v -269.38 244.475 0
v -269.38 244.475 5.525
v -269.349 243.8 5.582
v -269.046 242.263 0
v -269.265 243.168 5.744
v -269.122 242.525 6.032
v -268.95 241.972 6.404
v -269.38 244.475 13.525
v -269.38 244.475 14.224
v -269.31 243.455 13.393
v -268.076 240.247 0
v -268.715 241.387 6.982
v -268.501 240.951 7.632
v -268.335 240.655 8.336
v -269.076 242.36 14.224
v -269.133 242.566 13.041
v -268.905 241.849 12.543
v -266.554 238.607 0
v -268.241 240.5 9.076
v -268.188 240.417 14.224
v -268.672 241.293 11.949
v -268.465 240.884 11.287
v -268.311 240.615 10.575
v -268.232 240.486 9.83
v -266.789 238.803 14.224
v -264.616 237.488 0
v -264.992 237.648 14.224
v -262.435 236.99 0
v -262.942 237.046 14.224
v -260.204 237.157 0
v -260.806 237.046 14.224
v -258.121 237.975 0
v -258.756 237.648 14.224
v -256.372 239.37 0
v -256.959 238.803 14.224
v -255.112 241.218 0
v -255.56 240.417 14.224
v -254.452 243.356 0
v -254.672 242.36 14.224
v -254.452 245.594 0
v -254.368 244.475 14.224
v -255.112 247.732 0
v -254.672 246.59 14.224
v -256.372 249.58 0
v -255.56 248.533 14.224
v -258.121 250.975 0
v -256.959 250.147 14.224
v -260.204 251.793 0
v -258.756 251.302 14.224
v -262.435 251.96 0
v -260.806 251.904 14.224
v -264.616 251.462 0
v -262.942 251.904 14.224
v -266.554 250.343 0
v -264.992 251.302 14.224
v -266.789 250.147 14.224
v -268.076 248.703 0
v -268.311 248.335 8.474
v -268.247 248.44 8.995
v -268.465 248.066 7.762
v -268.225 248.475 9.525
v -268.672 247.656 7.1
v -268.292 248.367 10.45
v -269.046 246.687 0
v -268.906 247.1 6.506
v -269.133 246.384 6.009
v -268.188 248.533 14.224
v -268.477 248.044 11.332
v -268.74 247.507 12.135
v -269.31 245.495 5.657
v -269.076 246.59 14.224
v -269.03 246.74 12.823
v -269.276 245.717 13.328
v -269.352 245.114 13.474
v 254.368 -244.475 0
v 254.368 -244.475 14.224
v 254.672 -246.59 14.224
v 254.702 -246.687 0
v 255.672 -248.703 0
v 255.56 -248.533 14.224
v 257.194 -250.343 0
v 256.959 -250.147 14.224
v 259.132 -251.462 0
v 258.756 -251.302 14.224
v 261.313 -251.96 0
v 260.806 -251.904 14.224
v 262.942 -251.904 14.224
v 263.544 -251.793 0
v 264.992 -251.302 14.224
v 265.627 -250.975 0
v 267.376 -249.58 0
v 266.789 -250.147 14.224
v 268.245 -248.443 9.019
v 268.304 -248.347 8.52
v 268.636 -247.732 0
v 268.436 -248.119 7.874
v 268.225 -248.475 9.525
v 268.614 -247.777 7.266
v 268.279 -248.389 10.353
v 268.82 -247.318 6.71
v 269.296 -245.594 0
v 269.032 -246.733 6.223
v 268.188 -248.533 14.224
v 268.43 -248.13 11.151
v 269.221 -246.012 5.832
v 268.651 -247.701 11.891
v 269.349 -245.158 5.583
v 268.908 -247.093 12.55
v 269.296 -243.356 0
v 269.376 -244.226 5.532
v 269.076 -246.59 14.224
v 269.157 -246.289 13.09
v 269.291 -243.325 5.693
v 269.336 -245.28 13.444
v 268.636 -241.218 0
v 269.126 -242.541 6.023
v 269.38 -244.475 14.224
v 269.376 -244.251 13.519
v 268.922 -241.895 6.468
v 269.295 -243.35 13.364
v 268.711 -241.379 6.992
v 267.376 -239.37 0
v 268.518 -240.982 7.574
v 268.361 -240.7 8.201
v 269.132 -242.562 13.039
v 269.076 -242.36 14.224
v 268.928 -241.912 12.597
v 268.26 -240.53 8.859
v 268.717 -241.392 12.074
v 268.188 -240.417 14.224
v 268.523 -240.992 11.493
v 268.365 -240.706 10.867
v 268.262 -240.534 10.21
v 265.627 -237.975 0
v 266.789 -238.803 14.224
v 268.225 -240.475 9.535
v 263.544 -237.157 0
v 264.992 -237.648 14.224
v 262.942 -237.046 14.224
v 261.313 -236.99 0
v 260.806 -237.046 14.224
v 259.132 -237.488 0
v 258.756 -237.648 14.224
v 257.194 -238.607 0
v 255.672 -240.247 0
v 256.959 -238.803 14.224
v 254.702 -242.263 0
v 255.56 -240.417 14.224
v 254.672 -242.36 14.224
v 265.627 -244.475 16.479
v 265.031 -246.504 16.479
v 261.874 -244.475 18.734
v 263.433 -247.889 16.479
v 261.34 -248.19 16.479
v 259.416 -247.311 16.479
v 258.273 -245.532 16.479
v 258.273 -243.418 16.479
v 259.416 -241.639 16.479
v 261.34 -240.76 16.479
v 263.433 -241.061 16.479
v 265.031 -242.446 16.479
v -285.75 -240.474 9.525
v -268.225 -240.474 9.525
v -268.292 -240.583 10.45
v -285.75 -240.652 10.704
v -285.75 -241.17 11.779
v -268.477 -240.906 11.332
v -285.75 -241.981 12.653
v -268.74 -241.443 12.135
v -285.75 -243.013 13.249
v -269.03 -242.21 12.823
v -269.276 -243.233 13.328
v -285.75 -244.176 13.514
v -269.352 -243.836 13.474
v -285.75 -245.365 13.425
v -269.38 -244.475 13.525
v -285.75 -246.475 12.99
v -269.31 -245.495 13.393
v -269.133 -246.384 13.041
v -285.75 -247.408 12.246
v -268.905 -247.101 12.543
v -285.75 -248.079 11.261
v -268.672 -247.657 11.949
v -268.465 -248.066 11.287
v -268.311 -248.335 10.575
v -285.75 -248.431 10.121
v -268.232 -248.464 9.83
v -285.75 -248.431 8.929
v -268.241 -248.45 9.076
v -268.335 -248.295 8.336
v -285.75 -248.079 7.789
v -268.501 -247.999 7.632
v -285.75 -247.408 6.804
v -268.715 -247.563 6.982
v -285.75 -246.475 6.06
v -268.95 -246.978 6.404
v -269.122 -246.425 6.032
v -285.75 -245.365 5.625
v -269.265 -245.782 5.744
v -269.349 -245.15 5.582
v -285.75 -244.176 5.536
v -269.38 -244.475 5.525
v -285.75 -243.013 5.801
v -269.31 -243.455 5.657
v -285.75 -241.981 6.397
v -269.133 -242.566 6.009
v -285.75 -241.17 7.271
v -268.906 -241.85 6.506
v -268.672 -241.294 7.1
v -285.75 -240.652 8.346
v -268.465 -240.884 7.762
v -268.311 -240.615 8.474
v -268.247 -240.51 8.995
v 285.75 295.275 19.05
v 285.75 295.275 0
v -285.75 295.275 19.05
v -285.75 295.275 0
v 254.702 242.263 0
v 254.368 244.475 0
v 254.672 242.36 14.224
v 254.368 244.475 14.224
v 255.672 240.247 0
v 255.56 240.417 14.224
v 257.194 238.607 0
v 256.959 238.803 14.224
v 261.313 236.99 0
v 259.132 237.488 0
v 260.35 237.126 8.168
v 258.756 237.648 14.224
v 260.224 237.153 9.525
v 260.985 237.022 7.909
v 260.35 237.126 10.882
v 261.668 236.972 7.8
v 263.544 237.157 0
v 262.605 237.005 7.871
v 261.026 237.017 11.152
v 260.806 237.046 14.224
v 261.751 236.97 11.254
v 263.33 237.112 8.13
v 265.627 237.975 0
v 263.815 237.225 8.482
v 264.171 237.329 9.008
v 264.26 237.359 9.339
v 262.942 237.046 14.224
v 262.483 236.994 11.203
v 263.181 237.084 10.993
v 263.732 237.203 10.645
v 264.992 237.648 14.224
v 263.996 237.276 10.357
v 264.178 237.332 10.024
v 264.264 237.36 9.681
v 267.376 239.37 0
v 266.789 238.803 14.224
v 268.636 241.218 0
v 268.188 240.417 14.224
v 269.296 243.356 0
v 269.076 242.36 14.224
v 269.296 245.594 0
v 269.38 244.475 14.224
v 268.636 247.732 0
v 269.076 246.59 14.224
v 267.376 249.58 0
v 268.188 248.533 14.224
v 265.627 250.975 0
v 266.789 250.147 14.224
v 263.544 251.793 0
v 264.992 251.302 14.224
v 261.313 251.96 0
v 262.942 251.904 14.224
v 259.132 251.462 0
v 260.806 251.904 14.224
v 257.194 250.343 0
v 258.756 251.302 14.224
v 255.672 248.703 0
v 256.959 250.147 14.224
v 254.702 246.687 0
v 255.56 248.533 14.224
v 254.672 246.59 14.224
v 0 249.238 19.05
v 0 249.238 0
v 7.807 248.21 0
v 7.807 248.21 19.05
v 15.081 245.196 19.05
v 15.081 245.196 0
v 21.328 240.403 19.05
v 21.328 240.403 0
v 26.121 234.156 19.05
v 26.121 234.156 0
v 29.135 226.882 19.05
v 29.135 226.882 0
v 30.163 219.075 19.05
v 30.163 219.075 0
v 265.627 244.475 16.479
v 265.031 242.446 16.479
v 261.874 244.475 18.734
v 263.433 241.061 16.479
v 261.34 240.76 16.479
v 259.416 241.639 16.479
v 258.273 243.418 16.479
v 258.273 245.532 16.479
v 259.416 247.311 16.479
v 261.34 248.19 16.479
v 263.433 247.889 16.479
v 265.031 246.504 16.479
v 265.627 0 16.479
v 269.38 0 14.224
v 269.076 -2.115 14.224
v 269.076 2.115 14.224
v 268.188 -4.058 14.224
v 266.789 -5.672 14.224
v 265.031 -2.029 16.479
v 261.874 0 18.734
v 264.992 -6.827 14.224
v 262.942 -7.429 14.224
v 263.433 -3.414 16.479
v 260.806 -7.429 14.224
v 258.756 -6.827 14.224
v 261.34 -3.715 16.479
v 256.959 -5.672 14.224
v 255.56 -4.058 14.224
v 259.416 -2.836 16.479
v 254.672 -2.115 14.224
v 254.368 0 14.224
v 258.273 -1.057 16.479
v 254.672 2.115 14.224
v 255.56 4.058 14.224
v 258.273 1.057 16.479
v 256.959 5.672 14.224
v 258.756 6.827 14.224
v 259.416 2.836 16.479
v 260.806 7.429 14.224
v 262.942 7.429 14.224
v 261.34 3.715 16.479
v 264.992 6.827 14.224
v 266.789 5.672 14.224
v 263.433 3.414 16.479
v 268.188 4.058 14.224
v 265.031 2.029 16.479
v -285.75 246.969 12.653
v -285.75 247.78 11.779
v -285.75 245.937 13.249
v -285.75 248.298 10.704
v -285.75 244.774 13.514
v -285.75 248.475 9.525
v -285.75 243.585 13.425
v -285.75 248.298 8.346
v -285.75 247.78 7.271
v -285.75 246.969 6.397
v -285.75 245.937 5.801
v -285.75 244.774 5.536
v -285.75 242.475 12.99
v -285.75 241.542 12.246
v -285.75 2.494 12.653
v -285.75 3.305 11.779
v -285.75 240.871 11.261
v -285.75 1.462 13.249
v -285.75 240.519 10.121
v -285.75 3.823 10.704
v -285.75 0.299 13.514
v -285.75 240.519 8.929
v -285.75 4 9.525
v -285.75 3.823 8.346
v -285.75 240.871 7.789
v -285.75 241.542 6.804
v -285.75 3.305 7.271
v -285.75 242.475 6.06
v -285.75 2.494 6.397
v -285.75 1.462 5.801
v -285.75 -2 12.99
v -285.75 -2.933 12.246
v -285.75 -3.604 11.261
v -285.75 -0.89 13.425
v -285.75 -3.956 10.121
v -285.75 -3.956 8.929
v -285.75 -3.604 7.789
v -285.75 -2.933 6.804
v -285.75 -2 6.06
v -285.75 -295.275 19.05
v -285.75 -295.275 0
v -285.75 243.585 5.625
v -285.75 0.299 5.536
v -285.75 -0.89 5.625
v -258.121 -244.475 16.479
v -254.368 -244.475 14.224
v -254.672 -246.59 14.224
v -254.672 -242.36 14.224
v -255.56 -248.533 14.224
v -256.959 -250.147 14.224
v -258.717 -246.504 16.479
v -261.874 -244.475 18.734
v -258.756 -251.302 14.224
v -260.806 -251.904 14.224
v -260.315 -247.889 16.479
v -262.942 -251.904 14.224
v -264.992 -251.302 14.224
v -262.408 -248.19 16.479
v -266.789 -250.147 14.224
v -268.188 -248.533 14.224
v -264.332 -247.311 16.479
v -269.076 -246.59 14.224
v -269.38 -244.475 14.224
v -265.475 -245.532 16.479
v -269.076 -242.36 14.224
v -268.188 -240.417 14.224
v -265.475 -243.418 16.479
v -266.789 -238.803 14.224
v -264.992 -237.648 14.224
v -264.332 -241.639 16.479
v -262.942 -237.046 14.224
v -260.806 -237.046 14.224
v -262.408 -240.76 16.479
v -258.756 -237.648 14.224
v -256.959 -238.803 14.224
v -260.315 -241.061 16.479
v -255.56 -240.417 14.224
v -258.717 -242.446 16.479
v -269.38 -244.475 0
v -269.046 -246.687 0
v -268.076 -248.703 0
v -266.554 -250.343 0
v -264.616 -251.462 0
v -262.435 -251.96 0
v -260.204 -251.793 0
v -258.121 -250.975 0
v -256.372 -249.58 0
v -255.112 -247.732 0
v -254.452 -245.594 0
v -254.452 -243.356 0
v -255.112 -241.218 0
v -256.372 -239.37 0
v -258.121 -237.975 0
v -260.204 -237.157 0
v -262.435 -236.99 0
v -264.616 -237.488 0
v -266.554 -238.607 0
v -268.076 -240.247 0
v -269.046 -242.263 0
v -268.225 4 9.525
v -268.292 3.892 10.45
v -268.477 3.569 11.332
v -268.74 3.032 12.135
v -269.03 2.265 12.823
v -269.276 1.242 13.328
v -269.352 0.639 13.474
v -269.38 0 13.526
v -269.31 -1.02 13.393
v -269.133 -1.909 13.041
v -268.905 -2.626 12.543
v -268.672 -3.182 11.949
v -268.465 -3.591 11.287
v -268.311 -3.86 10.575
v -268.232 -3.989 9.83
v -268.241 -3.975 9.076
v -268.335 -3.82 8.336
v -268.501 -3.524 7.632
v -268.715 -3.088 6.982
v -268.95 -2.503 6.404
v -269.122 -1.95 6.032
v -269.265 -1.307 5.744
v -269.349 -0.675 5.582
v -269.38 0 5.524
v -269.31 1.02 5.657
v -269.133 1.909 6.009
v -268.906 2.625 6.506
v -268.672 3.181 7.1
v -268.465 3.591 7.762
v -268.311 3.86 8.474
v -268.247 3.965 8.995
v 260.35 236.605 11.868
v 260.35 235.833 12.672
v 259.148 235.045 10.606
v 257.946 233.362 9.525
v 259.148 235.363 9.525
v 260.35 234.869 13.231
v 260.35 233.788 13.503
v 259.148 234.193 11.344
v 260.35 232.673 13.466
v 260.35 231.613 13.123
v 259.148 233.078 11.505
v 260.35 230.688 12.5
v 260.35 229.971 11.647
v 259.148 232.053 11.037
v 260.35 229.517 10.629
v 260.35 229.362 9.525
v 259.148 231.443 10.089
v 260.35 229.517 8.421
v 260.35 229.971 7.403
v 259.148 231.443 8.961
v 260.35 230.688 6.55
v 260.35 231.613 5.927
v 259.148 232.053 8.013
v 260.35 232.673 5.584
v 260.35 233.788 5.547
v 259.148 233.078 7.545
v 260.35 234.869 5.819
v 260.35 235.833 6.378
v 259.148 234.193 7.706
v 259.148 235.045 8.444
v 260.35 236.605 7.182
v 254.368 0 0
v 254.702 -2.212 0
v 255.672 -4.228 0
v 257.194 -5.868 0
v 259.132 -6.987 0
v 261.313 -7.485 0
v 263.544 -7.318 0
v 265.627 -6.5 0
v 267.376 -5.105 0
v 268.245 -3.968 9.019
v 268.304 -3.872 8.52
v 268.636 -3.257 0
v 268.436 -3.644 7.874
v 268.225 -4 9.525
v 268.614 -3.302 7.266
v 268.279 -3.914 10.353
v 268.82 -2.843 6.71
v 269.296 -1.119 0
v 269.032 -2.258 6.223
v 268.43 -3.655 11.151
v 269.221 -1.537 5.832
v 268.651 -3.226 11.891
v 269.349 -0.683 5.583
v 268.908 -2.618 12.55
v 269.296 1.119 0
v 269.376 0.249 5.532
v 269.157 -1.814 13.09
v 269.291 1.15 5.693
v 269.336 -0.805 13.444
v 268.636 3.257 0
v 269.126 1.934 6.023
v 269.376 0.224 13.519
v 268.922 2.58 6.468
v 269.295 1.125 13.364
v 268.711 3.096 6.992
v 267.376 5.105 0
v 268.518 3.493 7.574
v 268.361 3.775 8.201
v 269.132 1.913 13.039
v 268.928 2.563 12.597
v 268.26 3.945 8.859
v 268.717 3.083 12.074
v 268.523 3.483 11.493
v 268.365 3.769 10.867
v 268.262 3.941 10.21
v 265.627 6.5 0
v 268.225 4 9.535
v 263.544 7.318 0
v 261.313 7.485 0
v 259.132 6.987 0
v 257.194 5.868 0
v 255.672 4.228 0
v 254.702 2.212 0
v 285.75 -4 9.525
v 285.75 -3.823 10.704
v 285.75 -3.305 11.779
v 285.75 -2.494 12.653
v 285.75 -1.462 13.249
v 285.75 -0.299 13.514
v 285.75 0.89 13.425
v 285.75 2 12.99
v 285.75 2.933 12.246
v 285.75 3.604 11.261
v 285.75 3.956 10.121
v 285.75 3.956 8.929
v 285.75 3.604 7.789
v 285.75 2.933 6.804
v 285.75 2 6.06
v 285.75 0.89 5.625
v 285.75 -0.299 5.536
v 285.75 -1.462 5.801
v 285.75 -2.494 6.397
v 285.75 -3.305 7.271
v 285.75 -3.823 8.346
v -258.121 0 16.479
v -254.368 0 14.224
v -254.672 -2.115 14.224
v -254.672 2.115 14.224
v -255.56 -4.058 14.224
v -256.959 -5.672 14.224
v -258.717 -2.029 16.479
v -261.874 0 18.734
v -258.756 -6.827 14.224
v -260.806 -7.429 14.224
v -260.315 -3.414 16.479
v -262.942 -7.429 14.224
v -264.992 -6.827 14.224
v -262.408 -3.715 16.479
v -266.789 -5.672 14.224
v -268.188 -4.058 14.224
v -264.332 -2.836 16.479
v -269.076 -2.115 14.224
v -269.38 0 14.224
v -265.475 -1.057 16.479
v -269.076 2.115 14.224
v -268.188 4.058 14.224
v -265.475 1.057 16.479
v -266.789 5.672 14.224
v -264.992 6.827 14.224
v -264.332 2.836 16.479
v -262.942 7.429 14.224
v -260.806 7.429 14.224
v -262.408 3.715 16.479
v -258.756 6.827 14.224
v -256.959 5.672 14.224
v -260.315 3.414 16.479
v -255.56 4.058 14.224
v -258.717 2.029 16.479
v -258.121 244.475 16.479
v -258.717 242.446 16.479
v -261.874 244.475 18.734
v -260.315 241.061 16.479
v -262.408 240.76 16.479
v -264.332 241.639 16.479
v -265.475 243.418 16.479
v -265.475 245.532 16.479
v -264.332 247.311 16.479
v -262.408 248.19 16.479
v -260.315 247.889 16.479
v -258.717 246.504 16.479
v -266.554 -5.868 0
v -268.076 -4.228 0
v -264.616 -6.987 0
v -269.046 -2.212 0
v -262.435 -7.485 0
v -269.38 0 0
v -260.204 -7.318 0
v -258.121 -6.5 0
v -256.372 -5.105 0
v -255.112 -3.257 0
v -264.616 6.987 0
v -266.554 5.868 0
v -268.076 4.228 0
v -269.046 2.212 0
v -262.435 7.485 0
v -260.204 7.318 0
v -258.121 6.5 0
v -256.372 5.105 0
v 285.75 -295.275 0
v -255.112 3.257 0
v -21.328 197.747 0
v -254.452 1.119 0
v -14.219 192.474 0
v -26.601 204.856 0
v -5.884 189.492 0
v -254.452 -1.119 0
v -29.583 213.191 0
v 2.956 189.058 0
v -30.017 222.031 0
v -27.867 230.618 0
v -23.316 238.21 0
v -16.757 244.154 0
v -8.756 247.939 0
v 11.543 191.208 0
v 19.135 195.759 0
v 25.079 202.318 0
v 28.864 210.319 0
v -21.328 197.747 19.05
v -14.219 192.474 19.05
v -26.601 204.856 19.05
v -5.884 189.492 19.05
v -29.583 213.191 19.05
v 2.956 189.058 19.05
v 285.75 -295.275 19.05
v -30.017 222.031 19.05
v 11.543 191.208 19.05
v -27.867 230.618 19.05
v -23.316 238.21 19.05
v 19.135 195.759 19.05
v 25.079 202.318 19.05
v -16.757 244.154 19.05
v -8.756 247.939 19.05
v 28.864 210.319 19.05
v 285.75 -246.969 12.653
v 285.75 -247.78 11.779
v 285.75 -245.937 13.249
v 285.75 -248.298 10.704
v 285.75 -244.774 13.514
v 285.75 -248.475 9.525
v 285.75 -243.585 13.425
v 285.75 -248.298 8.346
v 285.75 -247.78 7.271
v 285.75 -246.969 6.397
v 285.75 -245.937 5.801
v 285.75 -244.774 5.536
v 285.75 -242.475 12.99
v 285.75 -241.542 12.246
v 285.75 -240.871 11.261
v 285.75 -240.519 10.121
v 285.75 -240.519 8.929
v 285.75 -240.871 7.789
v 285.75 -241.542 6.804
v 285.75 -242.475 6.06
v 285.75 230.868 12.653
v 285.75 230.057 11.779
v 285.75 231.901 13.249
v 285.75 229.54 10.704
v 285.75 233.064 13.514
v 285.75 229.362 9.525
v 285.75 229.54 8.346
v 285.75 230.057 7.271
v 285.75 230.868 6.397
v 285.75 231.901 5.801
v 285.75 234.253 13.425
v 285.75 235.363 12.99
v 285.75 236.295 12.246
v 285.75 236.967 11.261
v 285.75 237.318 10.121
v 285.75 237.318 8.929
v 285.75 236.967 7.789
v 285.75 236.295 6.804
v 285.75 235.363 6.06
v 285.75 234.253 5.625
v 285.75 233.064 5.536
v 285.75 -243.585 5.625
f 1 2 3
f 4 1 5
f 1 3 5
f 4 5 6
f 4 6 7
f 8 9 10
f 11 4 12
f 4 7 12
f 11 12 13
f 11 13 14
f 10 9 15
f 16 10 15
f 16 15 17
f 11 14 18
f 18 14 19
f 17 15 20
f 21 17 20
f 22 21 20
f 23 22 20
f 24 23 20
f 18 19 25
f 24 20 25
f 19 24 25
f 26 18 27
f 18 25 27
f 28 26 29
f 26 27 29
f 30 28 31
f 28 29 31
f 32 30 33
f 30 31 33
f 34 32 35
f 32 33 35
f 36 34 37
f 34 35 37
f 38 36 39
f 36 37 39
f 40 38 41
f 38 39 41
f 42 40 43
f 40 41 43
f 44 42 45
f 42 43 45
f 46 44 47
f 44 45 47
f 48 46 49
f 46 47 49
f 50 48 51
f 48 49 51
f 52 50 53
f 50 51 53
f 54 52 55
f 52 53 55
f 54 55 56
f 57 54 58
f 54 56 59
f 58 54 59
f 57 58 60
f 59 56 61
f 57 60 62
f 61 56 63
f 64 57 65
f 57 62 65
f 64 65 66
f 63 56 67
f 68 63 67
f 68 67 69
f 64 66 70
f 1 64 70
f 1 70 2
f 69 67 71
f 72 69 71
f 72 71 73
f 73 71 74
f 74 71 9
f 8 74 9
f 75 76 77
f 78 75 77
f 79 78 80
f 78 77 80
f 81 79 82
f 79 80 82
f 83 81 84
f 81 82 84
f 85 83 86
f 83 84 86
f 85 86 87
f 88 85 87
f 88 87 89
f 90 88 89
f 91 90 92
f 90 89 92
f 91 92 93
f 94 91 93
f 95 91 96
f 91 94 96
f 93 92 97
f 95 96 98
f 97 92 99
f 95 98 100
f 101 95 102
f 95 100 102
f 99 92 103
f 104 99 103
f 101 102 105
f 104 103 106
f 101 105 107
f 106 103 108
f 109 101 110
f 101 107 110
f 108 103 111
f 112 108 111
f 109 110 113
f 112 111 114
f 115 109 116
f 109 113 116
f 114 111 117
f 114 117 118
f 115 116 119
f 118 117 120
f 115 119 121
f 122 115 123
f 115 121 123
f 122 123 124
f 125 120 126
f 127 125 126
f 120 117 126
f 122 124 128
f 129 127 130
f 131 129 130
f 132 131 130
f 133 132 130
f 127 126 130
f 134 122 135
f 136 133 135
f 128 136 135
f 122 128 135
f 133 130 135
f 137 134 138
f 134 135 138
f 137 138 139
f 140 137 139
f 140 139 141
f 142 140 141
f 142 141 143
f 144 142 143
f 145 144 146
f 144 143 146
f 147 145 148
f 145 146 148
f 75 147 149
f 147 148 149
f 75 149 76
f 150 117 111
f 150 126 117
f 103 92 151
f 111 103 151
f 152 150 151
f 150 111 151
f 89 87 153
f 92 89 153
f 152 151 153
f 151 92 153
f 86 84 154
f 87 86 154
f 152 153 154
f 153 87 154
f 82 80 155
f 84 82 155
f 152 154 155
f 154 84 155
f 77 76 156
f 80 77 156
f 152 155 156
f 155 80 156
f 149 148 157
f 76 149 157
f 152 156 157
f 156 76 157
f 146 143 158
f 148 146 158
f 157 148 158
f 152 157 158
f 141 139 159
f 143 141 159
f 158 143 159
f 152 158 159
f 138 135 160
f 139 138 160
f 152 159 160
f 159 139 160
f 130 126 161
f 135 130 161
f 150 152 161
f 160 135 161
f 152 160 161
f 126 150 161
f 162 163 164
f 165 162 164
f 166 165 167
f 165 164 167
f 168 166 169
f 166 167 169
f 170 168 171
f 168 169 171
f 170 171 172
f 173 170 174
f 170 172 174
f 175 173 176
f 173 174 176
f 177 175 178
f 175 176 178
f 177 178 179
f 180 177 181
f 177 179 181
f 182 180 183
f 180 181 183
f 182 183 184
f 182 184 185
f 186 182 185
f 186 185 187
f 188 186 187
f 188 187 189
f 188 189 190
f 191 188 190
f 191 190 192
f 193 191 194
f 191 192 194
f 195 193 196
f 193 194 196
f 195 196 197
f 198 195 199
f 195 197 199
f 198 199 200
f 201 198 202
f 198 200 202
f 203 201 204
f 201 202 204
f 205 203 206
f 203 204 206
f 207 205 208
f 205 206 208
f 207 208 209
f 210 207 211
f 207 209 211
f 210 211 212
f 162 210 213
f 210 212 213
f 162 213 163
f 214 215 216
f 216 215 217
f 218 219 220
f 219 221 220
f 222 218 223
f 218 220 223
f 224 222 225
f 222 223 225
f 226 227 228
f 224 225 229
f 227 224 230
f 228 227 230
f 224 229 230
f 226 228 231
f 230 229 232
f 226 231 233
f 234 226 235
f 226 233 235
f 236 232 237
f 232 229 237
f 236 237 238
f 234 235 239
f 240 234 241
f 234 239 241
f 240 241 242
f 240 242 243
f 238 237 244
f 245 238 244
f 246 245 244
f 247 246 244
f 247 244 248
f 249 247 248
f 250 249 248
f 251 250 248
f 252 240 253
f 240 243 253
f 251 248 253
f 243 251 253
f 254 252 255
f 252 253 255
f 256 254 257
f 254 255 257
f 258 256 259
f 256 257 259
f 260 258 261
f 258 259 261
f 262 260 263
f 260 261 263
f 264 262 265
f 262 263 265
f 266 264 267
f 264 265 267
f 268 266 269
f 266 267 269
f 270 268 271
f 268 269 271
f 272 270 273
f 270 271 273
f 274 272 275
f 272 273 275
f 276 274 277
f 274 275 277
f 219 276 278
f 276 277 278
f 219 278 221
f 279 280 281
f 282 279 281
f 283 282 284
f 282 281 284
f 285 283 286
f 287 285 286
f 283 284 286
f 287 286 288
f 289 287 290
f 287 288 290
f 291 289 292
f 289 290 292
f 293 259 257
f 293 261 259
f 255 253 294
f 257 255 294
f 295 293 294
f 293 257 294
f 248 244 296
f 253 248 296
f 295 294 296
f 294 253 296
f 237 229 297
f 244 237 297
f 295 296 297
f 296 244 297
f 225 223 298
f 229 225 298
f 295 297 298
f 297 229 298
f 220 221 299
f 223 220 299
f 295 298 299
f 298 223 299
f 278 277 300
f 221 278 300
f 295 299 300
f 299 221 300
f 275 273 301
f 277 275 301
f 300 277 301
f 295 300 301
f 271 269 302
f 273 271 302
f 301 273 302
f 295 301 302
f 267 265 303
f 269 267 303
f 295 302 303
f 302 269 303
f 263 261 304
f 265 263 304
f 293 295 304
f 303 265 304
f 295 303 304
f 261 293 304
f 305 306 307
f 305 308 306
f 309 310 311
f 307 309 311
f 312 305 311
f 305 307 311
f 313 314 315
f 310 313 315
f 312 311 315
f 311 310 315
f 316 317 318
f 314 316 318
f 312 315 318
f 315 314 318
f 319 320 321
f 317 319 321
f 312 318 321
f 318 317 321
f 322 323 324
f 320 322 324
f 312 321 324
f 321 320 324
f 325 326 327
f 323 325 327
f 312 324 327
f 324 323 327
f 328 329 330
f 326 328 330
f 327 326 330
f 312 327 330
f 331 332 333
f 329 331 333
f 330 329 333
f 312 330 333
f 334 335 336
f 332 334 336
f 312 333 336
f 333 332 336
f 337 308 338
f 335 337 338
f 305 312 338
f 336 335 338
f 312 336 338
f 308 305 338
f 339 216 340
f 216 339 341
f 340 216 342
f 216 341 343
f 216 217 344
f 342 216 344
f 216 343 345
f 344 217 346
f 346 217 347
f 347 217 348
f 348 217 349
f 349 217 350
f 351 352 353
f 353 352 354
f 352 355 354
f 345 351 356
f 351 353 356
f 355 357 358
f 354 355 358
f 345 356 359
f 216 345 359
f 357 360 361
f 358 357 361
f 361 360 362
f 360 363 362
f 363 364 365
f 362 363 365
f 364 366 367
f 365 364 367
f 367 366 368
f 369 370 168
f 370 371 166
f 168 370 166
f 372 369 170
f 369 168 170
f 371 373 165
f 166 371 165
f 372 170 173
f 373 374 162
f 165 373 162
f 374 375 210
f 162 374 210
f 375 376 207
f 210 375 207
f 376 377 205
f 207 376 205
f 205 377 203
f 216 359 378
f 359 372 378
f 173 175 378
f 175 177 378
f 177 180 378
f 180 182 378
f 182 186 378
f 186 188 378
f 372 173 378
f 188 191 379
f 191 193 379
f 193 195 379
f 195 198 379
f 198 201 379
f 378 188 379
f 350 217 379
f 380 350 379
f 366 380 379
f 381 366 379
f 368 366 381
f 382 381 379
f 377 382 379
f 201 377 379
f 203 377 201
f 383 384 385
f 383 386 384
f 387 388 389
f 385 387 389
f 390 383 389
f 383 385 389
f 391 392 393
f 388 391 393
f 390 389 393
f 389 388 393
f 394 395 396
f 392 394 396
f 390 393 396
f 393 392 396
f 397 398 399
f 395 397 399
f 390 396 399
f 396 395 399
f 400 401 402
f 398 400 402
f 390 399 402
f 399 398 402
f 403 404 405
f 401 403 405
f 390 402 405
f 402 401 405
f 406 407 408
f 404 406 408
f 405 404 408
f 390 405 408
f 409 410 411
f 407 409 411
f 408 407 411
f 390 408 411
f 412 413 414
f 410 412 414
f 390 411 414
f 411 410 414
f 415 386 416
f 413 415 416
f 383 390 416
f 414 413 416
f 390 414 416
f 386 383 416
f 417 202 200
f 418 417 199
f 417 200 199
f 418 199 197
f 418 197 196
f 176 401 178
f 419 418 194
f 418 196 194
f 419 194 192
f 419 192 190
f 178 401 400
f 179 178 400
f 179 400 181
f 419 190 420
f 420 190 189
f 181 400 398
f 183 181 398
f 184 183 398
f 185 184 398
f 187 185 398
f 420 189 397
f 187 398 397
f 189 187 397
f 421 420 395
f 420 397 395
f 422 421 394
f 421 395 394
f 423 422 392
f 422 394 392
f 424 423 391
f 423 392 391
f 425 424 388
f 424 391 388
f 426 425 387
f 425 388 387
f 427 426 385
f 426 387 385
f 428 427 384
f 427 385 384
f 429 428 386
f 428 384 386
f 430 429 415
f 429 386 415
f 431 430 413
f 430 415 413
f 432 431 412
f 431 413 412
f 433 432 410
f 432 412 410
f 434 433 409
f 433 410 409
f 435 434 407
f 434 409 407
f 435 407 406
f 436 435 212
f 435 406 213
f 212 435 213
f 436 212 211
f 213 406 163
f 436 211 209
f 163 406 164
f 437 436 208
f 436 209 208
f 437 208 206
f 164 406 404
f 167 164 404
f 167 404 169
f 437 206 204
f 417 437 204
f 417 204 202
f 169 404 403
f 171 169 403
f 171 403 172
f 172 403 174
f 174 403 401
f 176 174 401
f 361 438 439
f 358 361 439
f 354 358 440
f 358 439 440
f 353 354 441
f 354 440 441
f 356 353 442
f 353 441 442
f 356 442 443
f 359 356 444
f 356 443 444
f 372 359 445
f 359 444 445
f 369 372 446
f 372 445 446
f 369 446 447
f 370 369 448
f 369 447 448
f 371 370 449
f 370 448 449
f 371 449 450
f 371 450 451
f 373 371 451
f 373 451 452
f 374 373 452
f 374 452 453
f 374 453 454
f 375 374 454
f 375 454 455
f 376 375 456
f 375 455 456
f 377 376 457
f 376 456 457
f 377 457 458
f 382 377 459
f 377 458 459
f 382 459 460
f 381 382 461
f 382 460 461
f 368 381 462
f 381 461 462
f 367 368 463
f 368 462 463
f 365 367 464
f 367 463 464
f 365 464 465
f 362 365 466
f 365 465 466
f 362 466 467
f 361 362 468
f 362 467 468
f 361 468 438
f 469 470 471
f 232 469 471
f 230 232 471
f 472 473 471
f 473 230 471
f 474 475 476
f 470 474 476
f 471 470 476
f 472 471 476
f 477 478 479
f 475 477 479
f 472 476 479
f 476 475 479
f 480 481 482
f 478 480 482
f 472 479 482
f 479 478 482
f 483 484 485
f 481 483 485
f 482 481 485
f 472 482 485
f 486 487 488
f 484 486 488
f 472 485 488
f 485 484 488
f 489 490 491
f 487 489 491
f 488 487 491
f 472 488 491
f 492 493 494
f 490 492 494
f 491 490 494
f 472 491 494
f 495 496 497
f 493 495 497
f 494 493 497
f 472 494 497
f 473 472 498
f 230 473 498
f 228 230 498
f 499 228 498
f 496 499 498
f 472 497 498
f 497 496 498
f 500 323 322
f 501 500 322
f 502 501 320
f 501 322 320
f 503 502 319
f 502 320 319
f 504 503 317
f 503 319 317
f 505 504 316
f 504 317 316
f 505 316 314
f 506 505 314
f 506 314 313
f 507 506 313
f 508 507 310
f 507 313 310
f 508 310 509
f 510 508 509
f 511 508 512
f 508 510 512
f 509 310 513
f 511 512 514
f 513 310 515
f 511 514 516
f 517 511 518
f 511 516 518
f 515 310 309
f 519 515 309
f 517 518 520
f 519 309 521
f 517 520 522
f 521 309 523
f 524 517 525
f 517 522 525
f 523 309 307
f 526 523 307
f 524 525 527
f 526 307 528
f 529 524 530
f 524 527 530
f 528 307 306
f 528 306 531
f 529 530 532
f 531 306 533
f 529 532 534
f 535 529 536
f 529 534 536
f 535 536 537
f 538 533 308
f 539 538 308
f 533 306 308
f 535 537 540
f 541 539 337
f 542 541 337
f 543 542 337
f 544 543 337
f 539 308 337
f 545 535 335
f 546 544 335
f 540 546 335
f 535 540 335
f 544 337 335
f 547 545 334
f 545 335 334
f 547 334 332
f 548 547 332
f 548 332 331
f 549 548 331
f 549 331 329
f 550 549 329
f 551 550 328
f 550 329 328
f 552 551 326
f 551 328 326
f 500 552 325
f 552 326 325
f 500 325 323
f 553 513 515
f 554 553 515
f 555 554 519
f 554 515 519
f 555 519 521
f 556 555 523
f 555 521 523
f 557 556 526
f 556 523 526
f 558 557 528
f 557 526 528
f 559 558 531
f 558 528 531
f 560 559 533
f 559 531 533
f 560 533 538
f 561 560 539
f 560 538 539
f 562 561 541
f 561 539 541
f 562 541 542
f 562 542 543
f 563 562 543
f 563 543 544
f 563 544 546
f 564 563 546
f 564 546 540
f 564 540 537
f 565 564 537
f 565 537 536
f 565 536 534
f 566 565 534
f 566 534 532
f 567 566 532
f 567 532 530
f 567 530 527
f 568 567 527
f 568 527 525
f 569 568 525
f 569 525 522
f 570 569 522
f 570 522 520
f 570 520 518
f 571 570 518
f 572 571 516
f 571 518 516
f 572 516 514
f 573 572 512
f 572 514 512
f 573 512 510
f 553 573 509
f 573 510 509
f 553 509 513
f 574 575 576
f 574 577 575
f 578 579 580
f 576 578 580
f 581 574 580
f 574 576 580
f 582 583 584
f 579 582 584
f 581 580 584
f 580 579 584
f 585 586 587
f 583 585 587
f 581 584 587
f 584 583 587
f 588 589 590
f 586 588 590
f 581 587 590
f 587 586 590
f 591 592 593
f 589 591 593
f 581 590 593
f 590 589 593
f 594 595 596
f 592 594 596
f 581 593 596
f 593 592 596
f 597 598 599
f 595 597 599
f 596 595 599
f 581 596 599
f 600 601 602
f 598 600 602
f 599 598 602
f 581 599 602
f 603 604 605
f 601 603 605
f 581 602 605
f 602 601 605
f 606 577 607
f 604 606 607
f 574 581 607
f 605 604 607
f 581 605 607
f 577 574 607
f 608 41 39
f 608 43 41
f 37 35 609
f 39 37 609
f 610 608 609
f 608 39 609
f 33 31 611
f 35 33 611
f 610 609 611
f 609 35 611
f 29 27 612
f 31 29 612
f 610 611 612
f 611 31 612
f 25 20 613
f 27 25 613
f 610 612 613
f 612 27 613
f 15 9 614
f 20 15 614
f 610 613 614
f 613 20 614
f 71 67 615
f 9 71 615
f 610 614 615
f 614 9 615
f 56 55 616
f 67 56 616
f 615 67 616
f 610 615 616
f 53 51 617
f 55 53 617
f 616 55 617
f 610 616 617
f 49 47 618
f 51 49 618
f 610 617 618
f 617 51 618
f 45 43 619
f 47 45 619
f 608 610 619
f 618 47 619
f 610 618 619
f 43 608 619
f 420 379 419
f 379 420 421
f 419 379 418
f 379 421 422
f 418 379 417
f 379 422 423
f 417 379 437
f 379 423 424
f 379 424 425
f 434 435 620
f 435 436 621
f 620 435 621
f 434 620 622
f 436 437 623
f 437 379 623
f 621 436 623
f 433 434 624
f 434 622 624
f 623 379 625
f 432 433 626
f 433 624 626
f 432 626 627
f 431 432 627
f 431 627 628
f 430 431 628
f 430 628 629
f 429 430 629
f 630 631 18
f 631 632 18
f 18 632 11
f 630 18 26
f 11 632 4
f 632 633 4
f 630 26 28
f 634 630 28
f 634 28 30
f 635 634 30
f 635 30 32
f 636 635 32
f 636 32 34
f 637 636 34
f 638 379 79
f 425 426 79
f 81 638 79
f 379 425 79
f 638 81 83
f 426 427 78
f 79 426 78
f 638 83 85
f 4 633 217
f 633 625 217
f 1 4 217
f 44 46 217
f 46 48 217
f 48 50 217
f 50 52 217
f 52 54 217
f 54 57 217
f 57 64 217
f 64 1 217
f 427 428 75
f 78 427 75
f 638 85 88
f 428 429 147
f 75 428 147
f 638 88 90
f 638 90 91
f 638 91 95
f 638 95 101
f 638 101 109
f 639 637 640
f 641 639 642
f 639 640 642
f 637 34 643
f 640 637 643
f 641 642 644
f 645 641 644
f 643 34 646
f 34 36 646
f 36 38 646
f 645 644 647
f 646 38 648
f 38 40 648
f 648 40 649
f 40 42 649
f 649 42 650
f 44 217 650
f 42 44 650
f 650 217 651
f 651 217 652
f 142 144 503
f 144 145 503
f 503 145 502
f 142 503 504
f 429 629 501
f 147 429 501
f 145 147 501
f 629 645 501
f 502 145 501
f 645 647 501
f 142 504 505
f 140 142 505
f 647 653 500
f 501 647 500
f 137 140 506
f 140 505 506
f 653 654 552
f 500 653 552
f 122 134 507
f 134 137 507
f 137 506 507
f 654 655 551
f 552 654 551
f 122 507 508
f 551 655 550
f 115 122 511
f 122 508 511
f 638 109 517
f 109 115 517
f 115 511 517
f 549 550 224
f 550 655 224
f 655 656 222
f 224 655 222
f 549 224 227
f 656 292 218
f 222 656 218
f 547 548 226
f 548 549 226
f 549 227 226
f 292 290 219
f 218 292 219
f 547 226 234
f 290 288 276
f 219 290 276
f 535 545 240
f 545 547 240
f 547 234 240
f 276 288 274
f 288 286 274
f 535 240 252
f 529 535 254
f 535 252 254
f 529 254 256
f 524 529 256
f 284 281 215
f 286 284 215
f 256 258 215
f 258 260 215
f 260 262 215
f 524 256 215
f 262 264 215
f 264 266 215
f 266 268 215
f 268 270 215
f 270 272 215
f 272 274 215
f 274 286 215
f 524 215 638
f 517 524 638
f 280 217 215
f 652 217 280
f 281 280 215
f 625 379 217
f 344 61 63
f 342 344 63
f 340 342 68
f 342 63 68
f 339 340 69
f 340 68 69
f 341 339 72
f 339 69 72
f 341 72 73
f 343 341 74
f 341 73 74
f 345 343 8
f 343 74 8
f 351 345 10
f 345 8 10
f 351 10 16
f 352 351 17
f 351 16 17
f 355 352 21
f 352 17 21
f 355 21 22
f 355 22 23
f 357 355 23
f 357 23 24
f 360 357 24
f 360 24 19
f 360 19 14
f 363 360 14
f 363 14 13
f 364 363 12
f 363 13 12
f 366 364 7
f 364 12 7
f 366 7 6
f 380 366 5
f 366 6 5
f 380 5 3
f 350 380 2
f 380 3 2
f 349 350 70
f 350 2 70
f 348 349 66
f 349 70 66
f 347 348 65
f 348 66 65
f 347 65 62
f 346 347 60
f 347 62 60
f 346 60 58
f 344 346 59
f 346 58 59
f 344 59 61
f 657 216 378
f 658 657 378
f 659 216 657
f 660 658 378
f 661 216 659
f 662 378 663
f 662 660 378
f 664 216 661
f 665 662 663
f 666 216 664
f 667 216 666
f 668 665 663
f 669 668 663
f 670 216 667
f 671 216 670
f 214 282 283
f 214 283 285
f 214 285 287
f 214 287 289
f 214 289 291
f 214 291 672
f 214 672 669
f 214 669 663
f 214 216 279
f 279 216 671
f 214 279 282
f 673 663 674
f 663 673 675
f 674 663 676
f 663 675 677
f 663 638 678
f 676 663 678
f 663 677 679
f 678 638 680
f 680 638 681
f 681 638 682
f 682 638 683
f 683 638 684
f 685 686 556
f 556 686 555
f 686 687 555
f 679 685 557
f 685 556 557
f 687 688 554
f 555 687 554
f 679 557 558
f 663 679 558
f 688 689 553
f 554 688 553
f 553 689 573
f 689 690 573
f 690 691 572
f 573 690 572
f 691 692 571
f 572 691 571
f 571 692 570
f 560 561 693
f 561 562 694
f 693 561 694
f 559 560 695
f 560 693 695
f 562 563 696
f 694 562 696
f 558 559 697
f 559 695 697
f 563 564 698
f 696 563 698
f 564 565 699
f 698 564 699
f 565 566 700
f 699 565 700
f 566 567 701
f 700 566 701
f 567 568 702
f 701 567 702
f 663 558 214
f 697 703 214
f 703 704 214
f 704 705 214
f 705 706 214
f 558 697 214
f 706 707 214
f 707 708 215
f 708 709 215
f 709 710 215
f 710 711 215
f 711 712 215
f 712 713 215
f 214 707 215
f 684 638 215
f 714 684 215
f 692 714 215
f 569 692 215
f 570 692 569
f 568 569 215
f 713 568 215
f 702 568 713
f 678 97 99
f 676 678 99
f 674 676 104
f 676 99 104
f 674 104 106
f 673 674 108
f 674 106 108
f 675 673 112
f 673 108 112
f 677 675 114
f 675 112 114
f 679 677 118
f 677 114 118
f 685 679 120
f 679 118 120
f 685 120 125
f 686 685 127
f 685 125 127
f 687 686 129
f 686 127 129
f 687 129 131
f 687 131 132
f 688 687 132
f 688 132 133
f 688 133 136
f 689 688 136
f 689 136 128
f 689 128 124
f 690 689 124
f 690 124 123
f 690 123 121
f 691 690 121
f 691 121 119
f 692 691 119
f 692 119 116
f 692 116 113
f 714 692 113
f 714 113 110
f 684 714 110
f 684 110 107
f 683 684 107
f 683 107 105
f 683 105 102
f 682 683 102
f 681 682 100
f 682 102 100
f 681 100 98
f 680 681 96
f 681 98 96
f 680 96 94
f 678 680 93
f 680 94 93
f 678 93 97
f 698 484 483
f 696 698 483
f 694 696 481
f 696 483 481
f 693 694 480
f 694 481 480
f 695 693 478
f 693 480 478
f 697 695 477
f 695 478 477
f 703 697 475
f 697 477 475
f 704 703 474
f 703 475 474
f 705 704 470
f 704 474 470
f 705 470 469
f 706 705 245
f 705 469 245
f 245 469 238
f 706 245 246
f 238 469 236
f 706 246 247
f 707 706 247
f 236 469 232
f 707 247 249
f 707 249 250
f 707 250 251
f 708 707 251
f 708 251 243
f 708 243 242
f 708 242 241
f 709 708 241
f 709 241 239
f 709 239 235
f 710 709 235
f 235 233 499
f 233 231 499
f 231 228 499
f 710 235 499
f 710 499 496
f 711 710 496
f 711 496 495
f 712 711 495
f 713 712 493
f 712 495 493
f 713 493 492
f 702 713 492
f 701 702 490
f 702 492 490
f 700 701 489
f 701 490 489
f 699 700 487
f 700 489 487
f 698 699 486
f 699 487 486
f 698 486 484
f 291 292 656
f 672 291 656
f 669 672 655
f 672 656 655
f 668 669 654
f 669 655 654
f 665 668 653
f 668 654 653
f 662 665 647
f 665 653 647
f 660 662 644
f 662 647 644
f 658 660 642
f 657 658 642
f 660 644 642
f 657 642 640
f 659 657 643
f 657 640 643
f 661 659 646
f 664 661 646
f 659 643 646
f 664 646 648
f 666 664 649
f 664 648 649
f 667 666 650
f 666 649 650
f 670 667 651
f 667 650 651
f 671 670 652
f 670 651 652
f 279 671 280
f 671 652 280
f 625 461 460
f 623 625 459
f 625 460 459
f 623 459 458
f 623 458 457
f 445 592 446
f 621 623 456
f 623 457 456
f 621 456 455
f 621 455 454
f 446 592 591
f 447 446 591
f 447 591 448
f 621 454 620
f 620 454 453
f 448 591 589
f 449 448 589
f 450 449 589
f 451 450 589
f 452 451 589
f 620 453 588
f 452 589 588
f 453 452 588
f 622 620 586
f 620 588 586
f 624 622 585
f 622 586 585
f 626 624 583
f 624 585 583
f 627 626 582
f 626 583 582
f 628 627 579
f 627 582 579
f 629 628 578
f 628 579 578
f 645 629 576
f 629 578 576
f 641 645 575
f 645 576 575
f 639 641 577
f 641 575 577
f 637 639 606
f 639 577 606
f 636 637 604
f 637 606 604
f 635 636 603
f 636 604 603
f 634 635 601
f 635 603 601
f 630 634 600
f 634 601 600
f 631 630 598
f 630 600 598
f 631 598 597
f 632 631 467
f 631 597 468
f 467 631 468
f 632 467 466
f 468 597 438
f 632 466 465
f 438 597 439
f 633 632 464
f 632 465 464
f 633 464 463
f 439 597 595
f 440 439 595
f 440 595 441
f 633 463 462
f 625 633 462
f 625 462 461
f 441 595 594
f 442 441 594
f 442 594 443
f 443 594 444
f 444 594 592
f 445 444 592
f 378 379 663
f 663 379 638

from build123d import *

# Parameters (mm, degrees)
F1_DEPTH = 19.05
F3_D     = 15.0114
F3_DEPTH = 14.224
F3_TIP   = 4.5098795482
F5_D     = 8.001
F5_DEPTH = 25.4
F5_TIP   = 2.4037429064
F7_D     = 8.001
F7_DEPTH = 25.4
F7_TIP   = 2.4037429064


# Not quite as in the source:
# - a feature names something its author has since deleted; it is built from what else it names


with BuildPart() as f1:
    # F0 (on Top) → F1 (new body)
    with BuildSketch(Plane.XY):
        Polygon((285.75, -295.275), (285.75, 295.275), (0, 295.275), (-285.75, 295.275), (-285.75, -295.275), align=None)
        with BuildLine():
            ThreePointArc((30.1625, 219.075), (-21.3281082875, 197.7468917125), (0, 249.2375))
            ThreePointArc((0, 249.2375), (21.3281082875, 240.4031082875), (30.1625, 219.075))
        make_face(mode=Mode.SUBTRACT)
    extrude(amount=F1_DEPTH)

    # F3
    with Locations(Plane(origin=(0, 0, 0), x_dir=(1, 0, 0), z_dir=(0, 0, -1))):
        with Locations((-261.874, 244.475), (261.874, 244.475), (-261.874, 0), (261.874, 0), (261.874, -244.475), (-261.874, -244.475)):
            Hole(F3_D / 2, depth=F3_DEPTH)
            with Locations((0, 0, -(F3_DEPTH + F3_TIP / 2))):  # 118° drill point
                Cone(0, F3_D / 2, F3_TIP, mode=Mode.SUBTRACT)

    # F5
    with Locations(Plane.YZ.offset(285.75)):
        with Locations((-244.475, 9.525), (0, 9.525), (233.3625, 9.525)):
            Hole(F5_D / 2, depth=F5_DEPTH)
            with Locations((0, 0, -(F5_DEPTH + F5_TIP / 2))):  # 118° drill point
                Cone(0, F5_D / 2, F5_TIP, mode=Mode.SUBTRACT)

    # F7
    with Locations(Plane(origin=(-285.75, 0, 0), x_dir=(0, -1, 0), z_dir=(-1, 0, 0))):
        with Locations((0, 9.525), (244.475, 9.525), (-244.475, 9.525)):
            Hole(F7_D / 2, depth=F7_DEPTH)
            with Locations((0, 0, -(F7_DEPTH + F7_TIP / 2))):  # 118° drill point
                Cone(0, F7_D / 2, F7_TIP, mode=Mode.SUBTRACT)


solid = f1.part
